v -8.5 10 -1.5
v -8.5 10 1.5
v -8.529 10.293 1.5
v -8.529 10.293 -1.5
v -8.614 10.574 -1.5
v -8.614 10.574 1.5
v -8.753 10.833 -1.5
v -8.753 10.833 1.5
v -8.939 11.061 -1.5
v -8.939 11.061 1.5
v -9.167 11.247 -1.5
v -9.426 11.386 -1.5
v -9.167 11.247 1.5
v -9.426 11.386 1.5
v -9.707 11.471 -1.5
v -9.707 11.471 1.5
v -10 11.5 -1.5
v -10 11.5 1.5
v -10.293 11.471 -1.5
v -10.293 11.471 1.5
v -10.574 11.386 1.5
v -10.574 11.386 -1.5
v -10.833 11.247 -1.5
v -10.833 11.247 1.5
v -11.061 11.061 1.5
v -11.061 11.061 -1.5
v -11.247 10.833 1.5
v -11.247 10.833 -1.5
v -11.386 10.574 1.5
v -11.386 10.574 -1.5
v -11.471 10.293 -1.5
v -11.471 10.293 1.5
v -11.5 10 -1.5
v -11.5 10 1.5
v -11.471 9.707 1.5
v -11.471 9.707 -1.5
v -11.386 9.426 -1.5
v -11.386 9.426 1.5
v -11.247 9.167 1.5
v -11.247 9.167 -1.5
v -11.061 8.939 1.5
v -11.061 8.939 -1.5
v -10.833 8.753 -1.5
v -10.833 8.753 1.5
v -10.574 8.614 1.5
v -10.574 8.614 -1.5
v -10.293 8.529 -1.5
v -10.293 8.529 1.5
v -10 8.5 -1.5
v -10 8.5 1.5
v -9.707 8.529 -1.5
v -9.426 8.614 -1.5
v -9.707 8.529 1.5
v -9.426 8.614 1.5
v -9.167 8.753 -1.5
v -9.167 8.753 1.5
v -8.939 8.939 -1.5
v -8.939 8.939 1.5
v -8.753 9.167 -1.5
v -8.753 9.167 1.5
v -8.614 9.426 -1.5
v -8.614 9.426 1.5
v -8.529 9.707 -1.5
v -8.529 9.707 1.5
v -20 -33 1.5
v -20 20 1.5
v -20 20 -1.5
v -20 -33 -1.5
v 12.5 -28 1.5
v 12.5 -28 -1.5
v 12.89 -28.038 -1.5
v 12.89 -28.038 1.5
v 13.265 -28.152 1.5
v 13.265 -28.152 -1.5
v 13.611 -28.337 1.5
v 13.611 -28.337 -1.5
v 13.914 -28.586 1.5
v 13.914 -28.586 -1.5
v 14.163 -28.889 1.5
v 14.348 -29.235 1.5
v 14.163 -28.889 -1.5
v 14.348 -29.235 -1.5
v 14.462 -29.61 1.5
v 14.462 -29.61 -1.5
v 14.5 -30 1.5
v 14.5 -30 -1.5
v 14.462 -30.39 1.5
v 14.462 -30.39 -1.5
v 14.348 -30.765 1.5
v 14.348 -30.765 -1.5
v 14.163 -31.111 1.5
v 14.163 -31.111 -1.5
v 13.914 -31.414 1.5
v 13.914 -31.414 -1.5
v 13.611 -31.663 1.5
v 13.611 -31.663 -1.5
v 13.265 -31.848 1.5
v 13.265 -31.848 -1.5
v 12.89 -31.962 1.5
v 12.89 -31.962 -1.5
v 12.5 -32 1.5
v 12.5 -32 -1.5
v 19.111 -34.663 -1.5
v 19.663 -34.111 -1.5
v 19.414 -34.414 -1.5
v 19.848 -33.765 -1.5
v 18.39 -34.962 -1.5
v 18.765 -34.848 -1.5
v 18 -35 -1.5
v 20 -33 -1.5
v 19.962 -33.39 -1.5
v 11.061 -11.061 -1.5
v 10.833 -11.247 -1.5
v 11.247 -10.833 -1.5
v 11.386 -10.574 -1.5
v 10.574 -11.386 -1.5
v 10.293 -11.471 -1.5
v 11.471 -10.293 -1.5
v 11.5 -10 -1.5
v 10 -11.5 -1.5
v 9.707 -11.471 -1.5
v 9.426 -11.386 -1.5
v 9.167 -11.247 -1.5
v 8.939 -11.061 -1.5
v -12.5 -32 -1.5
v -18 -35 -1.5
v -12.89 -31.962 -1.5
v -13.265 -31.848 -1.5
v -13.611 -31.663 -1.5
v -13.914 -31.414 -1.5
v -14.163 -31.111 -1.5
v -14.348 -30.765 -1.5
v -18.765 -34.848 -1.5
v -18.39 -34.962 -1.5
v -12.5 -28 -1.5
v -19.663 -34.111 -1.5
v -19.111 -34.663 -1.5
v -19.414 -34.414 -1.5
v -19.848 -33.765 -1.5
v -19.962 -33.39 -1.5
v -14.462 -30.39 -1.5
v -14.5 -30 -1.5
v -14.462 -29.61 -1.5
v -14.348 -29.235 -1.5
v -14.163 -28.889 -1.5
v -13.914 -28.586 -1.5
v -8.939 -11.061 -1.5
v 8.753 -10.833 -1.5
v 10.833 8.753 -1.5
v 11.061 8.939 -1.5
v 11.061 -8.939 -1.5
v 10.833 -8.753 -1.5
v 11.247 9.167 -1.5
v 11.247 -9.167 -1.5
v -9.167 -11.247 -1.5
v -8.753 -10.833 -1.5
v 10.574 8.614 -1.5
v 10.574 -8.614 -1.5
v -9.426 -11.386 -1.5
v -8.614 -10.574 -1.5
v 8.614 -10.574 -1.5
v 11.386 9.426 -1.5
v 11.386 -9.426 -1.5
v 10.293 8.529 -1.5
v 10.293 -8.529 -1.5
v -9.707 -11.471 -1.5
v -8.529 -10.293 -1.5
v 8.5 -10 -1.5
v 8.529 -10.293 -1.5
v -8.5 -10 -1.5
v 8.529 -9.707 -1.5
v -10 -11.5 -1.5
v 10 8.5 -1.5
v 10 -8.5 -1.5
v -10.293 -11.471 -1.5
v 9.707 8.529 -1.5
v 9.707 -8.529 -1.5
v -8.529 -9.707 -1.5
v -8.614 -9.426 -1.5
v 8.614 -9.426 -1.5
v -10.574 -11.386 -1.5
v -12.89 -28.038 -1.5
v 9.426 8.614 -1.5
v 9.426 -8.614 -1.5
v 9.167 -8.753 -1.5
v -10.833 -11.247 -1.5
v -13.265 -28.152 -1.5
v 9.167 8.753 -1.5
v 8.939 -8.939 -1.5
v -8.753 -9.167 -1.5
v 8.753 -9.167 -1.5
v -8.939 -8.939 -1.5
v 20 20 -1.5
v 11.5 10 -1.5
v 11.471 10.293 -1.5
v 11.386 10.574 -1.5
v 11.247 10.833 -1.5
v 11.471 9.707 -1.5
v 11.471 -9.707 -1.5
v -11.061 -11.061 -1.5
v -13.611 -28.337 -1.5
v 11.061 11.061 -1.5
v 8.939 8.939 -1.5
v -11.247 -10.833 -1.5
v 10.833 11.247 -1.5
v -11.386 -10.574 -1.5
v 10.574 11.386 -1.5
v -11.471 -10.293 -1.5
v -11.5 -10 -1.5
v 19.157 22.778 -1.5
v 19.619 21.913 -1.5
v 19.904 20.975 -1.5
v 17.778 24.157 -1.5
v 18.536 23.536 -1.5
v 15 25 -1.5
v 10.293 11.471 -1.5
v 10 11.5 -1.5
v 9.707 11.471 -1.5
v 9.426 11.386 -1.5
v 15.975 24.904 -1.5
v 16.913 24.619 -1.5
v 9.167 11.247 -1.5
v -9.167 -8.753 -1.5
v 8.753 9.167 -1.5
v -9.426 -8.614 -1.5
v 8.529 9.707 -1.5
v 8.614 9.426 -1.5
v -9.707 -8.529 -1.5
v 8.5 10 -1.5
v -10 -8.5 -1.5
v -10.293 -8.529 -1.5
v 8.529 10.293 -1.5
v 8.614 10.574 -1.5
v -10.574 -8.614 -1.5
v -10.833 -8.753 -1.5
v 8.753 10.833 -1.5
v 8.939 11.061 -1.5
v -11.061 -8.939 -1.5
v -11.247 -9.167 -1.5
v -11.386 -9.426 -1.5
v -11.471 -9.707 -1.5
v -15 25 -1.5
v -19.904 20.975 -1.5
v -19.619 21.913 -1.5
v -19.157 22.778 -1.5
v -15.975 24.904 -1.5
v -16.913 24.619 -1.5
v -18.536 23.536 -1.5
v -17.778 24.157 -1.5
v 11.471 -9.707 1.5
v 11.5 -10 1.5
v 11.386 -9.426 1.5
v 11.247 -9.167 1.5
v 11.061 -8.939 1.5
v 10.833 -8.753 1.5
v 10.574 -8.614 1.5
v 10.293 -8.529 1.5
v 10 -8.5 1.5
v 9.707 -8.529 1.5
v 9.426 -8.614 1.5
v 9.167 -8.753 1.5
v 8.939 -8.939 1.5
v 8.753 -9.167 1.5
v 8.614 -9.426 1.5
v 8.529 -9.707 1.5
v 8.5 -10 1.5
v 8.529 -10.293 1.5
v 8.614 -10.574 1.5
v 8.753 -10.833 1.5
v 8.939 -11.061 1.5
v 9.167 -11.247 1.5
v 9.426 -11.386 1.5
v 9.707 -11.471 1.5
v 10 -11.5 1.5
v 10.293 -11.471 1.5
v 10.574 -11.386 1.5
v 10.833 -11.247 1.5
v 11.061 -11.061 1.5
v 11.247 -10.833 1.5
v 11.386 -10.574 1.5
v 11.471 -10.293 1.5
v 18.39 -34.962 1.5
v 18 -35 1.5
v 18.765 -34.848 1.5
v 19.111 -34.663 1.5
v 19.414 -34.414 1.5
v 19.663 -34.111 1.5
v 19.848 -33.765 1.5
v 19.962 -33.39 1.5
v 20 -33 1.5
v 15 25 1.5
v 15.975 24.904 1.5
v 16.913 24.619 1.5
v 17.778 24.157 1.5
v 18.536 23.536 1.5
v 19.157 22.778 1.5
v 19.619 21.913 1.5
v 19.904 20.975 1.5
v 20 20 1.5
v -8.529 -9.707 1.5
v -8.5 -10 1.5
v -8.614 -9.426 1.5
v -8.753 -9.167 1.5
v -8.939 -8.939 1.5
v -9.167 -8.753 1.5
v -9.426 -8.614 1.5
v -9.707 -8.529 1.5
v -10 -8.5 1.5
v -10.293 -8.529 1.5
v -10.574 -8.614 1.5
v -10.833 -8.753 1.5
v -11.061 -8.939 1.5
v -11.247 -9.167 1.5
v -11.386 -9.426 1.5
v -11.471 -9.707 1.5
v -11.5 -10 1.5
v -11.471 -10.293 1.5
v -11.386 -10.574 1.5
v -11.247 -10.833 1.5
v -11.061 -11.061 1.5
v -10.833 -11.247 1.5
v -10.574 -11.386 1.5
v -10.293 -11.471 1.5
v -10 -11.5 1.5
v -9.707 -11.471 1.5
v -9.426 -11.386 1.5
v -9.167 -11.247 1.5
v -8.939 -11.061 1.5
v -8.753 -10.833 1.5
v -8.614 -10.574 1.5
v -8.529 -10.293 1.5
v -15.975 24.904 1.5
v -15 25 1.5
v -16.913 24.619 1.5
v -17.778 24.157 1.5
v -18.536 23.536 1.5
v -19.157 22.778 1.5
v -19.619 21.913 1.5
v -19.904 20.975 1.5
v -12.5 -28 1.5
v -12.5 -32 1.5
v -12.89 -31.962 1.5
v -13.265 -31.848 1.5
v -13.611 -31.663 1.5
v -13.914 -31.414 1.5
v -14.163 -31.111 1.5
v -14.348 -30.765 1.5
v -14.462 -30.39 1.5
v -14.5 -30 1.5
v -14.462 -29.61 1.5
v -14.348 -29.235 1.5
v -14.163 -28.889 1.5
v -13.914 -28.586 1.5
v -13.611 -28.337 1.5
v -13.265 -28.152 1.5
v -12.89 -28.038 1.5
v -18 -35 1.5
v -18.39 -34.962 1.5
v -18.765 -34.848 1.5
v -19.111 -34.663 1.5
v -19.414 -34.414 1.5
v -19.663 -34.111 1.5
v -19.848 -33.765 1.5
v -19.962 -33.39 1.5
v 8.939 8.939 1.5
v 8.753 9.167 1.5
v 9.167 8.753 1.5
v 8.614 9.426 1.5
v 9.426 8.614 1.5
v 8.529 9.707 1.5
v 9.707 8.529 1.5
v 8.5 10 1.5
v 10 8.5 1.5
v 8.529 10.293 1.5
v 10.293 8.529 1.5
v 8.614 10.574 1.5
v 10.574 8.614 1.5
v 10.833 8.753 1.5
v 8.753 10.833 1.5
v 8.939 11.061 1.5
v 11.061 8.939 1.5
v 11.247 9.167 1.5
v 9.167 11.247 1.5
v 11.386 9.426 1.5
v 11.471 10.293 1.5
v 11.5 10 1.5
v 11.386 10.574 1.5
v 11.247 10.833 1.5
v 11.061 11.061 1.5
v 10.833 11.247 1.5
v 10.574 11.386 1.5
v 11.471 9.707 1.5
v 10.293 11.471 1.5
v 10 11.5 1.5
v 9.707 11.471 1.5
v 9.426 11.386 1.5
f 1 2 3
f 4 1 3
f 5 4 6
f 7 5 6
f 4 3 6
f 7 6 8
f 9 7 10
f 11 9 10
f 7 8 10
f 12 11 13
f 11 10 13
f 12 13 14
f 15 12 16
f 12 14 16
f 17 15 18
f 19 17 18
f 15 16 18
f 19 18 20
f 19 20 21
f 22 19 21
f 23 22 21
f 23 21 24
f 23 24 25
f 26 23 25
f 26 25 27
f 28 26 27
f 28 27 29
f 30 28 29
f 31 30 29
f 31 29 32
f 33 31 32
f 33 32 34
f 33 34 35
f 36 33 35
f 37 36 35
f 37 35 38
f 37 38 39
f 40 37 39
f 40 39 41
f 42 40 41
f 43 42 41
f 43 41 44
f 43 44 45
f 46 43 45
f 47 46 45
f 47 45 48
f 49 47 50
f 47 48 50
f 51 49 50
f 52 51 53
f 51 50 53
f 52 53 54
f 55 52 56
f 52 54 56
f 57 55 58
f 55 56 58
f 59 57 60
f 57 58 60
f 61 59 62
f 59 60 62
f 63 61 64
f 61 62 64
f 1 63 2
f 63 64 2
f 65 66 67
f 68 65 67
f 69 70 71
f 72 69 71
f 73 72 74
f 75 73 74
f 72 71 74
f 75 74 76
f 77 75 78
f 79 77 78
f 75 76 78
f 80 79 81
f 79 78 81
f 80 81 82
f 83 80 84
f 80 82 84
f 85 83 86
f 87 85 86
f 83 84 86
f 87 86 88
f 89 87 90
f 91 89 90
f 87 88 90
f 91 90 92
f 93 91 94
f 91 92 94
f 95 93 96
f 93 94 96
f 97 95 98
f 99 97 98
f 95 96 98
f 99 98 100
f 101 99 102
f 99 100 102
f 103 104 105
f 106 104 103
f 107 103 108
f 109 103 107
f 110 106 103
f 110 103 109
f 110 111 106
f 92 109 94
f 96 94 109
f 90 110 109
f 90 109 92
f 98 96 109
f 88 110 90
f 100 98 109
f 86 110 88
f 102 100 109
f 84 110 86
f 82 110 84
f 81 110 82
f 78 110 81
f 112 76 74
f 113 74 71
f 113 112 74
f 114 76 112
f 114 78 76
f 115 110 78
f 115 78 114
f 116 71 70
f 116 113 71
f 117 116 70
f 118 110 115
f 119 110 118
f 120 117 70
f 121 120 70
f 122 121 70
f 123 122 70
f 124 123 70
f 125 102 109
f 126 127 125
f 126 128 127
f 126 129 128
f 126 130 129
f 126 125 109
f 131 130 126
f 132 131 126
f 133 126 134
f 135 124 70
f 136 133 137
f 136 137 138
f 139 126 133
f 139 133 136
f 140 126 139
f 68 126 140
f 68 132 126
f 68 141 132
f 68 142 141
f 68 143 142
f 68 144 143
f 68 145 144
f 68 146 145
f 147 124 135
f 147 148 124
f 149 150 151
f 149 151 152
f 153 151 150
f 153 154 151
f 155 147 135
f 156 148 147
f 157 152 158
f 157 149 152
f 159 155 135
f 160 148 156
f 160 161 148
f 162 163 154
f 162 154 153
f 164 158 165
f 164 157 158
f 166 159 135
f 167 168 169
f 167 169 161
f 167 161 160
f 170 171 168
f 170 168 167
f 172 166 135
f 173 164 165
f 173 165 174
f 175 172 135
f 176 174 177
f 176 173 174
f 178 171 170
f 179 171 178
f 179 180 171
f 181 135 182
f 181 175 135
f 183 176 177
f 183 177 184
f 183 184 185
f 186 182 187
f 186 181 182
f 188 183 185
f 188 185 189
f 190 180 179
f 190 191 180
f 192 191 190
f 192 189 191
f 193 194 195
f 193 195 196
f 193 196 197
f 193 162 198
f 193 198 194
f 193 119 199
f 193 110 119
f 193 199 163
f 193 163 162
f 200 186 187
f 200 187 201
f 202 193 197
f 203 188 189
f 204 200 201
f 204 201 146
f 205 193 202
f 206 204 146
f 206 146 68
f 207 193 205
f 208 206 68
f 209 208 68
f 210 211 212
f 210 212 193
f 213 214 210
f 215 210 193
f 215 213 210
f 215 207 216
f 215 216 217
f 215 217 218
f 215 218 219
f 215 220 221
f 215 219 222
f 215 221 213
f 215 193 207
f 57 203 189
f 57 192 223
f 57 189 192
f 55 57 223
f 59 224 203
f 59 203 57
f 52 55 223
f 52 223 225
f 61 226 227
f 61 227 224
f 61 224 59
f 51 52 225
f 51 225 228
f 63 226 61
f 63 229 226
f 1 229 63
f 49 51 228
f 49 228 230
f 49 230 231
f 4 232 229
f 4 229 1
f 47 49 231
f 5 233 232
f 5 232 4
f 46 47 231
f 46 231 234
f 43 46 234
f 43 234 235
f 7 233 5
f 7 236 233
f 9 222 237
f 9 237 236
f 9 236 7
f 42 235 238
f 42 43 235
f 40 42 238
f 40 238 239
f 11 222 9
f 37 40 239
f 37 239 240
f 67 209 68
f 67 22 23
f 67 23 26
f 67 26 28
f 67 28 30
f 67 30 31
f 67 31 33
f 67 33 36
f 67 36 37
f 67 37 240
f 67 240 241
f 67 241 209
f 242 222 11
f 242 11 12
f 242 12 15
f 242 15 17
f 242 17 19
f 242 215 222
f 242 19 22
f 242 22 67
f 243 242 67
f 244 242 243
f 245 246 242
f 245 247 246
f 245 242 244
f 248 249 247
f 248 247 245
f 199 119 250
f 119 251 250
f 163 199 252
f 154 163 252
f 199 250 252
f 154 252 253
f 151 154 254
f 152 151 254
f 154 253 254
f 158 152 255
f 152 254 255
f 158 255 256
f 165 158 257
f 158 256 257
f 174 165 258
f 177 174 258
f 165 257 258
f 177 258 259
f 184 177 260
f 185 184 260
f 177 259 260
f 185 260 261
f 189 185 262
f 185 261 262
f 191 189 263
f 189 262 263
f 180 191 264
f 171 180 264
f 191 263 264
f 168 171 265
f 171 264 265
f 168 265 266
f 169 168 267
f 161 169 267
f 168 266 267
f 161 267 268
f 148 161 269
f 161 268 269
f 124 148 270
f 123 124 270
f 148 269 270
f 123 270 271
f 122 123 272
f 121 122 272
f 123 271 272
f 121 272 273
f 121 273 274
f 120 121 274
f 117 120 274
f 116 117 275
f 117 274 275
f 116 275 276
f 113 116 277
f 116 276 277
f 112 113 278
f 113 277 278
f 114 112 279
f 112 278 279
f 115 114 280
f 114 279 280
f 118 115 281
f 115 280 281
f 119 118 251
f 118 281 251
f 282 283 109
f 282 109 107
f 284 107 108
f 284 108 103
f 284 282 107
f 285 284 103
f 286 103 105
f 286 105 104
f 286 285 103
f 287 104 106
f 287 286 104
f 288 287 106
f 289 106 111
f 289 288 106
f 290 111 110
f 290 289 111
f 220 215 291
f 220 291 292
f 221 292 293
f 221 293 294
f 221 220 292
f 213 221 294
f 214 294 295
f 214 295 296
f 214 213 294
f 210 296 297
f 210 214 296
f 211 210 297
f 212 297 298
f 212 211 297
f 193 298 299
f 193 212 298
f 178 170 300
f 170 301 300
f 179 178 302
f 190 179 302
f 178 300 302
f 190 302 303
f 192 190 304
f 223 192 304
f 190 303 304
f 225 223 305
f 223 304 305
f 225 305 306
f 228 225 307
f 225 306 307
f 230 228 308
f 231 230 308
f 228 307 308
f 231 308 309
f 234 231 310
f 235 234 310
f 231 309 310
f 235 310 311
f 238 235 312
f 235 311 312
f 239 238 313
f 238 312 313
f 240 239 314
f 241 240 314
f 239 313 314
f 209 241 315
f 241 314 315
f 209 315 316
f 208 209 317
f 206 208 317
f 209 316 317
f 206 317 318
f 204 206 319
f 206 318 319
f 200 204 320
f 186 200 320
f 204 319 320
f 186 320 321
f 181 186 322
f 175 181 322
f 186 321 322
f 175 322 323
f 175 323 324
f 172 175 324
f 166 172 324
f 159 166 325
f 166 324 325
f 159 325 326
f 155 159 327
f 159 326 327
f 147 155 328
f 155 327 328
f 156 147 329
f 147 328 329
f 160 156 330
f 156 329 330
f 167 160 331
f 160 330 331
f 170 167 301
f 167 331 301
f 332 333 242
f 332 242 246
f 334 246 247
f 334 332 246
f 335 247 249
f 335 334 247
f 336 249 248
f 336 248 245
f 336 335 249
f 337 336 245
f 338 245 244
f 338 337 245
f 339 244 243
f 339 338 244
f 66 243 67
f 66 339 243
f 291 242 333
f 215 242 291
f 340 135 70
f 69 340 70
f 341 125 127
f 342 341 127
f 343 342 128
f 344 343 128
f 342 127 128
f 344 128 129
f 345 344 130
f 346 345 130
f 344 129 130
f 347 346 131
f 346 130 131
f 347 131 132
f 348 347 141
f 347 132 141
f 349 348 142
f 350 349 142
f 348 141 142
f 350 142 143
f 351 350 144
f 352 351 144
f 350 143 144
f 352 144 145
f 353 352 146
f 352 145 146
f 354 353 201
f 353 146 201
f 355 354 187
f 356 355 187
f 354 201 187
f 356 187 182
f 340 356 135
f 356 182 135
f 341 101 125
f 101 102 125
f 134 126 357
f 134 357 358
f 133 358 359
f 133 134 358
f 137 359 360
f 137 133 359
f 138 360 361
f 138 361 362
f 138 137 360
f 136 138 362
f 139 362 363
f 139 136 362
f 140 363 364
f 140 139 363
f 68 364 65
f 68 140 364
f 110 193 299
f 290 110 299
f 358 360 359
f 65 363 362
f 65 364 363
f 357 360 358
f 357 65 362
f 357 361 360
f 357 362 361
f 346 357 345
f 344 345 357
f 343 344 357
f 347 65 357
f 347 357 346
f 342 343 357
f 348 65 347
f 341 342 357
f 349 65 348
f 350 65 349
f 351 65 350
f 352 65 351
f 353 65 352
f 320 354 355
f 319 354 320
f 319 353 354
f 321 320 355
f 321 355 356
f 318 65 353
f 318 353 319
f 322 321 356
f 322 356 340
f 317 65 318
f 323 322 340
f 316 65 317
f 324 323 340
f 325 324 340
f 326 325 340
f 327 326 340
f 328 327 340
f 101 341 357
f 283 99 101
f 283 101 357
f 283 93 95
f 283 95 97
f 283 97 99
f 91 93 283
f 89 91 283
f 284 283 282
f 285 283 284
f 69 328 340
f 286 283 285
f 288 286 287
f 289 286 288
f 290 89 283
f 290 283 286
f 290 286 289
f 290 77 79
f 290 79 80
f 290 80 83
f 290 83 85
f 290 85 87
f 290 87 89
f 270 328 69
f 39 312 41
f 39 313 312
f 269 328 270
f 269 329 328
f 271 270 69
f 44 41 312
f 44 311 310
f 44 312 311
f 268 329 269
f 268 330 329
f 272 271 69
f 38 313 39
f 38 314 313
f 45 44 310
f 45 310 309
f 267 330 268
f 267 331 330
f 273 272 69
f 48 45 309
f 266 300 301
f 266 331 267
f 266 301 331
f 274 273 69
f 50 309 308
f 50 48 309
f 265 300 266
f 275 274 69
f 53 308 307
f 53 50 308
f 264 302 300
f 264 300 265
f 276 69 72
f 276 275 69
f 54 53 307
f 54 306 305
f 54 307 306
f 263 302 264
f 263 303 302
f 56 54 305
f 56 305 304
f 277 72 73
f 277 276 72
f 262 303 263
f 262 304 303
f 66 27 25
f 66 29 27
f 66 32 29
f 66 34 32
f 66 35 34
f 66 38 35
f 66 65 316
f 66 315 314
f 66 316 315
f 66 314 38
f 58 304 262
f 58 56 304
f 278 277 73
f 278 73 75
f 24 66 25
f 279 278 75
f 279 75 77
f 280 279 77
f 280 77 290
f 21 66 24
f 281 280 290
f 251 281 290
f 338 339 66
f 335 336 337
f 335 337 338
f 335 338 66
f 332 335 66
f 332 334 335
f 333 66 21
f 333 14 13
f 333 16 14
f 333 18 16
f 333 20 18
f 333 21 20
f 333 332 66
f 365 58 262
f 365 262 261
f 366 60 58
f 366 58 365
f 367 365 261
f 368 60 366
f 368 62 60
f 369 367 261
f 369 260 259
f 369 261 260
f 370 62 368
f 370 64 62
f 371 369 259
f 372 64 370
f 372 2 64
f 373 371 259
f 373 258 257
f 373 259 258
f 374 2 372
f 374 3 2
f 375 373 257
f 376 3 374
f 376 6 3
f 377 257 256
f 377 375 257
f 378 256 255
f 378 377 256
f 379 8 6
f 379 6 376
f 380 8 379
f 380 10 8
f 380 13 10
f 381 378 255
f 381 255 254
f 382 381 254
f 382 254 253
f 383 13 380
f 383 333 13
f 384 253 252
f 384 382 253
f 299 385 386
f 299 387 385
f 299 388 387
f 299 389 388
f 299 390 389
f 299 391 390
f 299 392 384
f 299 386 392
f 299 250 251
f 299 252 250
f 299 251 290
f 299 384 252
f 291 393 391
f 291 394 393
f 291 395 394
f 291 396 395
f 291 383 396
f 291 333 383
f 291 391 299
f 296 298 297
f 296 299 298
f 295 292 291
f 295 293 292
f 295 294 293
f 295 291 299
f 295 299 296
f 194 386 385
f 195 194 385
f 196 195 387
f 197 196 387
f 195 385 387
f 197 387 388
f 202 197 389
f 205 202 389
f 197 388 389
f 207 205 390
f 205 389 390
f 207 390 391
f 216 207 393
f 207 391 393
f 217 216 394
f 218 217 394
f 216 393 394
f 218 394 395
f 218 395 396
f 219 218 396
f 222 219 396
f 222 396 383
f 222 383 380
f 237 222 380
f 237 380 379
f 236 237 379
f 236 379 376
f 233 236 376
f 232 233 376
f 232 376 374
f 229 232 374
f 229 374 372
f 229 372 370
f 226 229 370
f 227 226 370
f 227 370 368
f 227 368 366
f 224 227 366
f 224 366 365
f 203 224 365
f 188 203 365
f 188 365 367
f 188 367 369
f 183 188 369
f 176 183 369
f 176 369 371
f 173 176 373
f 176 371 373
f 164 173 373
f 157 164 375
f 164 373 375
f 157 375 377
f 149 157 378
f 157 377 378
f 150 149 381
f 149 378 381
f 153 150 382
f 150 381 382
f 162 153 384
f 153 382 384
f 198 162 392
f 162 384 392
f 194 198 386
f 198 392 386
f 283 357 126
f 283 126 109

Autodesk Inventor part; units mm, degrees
sketch "Эскиз1" plane through (0, 0, 0) normal (0, 0, 1) x (1, 0, 0)
  line L0 (-20, 25) -> (20, 25)
  line L1 (20, 25) -> (20, -25)
  line L2 (20, -25) -> (-20, -25)
  line L3 (-20, -25) -> (-20, 25)
  line L4 (-20, 25) -> (20, -25) construction
  line L5 (20, 25) -> (-20, -25) construction
  point P0 (0, 0)
  dimension "d1" = 40
  dimension "d10" = 50
extrude "Выдавливание1" add sketch "Эскиз1" along normal mid plane 3
fillet "Сопряжение1" radius 5 2 edges at (20, 25, 0) (-20, 25, 0)
sketch "Эскиз4" plane through (-20, -25, 1.5) normal (0, -1, 0) x (1, 0, 0)
  line L0 (40, -3) -> (40, 0) projected
  line L1 (0, 0) -> (40, 0) projected
  line L2 (0, 0) -> (0, -3) projected
  line L3 (40, -3) -> (0, -3) projected
  point P0 (20, -1.5)
extrude "Выдавливание4" add sketch "Эскиз4" along normal blind 10
sketch "Эскиз5" plane through (0, 0, -1.5) normal (0, 0, -1) x (-1, 0, 0)
  line L0 (12.5, -30) -> (-12.5, -30) construction
  line L1 (12.5, -28) -> (-12.5, -28)
  line L2 (-12.5, -32) -> (12.5, -32)
  arc A0 (12.5, -32) -> (12.5, -28) centre (12.5, -30) ccw
  arc A1 (-12.5, -28) -> (-12.5, -32) centre (-12.5, -30) ccw
  line L3 (0, -47) -> (0, 37) construction
  line L4 (20, -35) -> (-20, -35) projected
  point P0 (0, 0)
  point P1 (0, -30)
  dimension "d20" = 2
  dimension "d21" = 25
  dimension "d22" = 3
extrude "Выдавливание5" cut sketch "Эскиз5" against normal up to next
fillet "Сопряжение4" radius 2 2 edges at (-20, -35, 0) (20, -35, 0)
sketch "Эскиз6" plane through (0, 0, 1.5) normal (0, 0, 1) x (1, 0, 0)
  circle A0 centre (10, -10) radius 1.5 projected
  circle A1 centre (10, 10) radius 1.5 projected
  circle A2 centre (-10, 10) radius 1.5 projected
  circle A3 centre (-10, -10) radius 1.5 projected
  point P0 (0, 0)
extrude "Выдавливание6" cut sketch "Эскиз6" against normal up to next
properties part number "Фанерка_маркера"
